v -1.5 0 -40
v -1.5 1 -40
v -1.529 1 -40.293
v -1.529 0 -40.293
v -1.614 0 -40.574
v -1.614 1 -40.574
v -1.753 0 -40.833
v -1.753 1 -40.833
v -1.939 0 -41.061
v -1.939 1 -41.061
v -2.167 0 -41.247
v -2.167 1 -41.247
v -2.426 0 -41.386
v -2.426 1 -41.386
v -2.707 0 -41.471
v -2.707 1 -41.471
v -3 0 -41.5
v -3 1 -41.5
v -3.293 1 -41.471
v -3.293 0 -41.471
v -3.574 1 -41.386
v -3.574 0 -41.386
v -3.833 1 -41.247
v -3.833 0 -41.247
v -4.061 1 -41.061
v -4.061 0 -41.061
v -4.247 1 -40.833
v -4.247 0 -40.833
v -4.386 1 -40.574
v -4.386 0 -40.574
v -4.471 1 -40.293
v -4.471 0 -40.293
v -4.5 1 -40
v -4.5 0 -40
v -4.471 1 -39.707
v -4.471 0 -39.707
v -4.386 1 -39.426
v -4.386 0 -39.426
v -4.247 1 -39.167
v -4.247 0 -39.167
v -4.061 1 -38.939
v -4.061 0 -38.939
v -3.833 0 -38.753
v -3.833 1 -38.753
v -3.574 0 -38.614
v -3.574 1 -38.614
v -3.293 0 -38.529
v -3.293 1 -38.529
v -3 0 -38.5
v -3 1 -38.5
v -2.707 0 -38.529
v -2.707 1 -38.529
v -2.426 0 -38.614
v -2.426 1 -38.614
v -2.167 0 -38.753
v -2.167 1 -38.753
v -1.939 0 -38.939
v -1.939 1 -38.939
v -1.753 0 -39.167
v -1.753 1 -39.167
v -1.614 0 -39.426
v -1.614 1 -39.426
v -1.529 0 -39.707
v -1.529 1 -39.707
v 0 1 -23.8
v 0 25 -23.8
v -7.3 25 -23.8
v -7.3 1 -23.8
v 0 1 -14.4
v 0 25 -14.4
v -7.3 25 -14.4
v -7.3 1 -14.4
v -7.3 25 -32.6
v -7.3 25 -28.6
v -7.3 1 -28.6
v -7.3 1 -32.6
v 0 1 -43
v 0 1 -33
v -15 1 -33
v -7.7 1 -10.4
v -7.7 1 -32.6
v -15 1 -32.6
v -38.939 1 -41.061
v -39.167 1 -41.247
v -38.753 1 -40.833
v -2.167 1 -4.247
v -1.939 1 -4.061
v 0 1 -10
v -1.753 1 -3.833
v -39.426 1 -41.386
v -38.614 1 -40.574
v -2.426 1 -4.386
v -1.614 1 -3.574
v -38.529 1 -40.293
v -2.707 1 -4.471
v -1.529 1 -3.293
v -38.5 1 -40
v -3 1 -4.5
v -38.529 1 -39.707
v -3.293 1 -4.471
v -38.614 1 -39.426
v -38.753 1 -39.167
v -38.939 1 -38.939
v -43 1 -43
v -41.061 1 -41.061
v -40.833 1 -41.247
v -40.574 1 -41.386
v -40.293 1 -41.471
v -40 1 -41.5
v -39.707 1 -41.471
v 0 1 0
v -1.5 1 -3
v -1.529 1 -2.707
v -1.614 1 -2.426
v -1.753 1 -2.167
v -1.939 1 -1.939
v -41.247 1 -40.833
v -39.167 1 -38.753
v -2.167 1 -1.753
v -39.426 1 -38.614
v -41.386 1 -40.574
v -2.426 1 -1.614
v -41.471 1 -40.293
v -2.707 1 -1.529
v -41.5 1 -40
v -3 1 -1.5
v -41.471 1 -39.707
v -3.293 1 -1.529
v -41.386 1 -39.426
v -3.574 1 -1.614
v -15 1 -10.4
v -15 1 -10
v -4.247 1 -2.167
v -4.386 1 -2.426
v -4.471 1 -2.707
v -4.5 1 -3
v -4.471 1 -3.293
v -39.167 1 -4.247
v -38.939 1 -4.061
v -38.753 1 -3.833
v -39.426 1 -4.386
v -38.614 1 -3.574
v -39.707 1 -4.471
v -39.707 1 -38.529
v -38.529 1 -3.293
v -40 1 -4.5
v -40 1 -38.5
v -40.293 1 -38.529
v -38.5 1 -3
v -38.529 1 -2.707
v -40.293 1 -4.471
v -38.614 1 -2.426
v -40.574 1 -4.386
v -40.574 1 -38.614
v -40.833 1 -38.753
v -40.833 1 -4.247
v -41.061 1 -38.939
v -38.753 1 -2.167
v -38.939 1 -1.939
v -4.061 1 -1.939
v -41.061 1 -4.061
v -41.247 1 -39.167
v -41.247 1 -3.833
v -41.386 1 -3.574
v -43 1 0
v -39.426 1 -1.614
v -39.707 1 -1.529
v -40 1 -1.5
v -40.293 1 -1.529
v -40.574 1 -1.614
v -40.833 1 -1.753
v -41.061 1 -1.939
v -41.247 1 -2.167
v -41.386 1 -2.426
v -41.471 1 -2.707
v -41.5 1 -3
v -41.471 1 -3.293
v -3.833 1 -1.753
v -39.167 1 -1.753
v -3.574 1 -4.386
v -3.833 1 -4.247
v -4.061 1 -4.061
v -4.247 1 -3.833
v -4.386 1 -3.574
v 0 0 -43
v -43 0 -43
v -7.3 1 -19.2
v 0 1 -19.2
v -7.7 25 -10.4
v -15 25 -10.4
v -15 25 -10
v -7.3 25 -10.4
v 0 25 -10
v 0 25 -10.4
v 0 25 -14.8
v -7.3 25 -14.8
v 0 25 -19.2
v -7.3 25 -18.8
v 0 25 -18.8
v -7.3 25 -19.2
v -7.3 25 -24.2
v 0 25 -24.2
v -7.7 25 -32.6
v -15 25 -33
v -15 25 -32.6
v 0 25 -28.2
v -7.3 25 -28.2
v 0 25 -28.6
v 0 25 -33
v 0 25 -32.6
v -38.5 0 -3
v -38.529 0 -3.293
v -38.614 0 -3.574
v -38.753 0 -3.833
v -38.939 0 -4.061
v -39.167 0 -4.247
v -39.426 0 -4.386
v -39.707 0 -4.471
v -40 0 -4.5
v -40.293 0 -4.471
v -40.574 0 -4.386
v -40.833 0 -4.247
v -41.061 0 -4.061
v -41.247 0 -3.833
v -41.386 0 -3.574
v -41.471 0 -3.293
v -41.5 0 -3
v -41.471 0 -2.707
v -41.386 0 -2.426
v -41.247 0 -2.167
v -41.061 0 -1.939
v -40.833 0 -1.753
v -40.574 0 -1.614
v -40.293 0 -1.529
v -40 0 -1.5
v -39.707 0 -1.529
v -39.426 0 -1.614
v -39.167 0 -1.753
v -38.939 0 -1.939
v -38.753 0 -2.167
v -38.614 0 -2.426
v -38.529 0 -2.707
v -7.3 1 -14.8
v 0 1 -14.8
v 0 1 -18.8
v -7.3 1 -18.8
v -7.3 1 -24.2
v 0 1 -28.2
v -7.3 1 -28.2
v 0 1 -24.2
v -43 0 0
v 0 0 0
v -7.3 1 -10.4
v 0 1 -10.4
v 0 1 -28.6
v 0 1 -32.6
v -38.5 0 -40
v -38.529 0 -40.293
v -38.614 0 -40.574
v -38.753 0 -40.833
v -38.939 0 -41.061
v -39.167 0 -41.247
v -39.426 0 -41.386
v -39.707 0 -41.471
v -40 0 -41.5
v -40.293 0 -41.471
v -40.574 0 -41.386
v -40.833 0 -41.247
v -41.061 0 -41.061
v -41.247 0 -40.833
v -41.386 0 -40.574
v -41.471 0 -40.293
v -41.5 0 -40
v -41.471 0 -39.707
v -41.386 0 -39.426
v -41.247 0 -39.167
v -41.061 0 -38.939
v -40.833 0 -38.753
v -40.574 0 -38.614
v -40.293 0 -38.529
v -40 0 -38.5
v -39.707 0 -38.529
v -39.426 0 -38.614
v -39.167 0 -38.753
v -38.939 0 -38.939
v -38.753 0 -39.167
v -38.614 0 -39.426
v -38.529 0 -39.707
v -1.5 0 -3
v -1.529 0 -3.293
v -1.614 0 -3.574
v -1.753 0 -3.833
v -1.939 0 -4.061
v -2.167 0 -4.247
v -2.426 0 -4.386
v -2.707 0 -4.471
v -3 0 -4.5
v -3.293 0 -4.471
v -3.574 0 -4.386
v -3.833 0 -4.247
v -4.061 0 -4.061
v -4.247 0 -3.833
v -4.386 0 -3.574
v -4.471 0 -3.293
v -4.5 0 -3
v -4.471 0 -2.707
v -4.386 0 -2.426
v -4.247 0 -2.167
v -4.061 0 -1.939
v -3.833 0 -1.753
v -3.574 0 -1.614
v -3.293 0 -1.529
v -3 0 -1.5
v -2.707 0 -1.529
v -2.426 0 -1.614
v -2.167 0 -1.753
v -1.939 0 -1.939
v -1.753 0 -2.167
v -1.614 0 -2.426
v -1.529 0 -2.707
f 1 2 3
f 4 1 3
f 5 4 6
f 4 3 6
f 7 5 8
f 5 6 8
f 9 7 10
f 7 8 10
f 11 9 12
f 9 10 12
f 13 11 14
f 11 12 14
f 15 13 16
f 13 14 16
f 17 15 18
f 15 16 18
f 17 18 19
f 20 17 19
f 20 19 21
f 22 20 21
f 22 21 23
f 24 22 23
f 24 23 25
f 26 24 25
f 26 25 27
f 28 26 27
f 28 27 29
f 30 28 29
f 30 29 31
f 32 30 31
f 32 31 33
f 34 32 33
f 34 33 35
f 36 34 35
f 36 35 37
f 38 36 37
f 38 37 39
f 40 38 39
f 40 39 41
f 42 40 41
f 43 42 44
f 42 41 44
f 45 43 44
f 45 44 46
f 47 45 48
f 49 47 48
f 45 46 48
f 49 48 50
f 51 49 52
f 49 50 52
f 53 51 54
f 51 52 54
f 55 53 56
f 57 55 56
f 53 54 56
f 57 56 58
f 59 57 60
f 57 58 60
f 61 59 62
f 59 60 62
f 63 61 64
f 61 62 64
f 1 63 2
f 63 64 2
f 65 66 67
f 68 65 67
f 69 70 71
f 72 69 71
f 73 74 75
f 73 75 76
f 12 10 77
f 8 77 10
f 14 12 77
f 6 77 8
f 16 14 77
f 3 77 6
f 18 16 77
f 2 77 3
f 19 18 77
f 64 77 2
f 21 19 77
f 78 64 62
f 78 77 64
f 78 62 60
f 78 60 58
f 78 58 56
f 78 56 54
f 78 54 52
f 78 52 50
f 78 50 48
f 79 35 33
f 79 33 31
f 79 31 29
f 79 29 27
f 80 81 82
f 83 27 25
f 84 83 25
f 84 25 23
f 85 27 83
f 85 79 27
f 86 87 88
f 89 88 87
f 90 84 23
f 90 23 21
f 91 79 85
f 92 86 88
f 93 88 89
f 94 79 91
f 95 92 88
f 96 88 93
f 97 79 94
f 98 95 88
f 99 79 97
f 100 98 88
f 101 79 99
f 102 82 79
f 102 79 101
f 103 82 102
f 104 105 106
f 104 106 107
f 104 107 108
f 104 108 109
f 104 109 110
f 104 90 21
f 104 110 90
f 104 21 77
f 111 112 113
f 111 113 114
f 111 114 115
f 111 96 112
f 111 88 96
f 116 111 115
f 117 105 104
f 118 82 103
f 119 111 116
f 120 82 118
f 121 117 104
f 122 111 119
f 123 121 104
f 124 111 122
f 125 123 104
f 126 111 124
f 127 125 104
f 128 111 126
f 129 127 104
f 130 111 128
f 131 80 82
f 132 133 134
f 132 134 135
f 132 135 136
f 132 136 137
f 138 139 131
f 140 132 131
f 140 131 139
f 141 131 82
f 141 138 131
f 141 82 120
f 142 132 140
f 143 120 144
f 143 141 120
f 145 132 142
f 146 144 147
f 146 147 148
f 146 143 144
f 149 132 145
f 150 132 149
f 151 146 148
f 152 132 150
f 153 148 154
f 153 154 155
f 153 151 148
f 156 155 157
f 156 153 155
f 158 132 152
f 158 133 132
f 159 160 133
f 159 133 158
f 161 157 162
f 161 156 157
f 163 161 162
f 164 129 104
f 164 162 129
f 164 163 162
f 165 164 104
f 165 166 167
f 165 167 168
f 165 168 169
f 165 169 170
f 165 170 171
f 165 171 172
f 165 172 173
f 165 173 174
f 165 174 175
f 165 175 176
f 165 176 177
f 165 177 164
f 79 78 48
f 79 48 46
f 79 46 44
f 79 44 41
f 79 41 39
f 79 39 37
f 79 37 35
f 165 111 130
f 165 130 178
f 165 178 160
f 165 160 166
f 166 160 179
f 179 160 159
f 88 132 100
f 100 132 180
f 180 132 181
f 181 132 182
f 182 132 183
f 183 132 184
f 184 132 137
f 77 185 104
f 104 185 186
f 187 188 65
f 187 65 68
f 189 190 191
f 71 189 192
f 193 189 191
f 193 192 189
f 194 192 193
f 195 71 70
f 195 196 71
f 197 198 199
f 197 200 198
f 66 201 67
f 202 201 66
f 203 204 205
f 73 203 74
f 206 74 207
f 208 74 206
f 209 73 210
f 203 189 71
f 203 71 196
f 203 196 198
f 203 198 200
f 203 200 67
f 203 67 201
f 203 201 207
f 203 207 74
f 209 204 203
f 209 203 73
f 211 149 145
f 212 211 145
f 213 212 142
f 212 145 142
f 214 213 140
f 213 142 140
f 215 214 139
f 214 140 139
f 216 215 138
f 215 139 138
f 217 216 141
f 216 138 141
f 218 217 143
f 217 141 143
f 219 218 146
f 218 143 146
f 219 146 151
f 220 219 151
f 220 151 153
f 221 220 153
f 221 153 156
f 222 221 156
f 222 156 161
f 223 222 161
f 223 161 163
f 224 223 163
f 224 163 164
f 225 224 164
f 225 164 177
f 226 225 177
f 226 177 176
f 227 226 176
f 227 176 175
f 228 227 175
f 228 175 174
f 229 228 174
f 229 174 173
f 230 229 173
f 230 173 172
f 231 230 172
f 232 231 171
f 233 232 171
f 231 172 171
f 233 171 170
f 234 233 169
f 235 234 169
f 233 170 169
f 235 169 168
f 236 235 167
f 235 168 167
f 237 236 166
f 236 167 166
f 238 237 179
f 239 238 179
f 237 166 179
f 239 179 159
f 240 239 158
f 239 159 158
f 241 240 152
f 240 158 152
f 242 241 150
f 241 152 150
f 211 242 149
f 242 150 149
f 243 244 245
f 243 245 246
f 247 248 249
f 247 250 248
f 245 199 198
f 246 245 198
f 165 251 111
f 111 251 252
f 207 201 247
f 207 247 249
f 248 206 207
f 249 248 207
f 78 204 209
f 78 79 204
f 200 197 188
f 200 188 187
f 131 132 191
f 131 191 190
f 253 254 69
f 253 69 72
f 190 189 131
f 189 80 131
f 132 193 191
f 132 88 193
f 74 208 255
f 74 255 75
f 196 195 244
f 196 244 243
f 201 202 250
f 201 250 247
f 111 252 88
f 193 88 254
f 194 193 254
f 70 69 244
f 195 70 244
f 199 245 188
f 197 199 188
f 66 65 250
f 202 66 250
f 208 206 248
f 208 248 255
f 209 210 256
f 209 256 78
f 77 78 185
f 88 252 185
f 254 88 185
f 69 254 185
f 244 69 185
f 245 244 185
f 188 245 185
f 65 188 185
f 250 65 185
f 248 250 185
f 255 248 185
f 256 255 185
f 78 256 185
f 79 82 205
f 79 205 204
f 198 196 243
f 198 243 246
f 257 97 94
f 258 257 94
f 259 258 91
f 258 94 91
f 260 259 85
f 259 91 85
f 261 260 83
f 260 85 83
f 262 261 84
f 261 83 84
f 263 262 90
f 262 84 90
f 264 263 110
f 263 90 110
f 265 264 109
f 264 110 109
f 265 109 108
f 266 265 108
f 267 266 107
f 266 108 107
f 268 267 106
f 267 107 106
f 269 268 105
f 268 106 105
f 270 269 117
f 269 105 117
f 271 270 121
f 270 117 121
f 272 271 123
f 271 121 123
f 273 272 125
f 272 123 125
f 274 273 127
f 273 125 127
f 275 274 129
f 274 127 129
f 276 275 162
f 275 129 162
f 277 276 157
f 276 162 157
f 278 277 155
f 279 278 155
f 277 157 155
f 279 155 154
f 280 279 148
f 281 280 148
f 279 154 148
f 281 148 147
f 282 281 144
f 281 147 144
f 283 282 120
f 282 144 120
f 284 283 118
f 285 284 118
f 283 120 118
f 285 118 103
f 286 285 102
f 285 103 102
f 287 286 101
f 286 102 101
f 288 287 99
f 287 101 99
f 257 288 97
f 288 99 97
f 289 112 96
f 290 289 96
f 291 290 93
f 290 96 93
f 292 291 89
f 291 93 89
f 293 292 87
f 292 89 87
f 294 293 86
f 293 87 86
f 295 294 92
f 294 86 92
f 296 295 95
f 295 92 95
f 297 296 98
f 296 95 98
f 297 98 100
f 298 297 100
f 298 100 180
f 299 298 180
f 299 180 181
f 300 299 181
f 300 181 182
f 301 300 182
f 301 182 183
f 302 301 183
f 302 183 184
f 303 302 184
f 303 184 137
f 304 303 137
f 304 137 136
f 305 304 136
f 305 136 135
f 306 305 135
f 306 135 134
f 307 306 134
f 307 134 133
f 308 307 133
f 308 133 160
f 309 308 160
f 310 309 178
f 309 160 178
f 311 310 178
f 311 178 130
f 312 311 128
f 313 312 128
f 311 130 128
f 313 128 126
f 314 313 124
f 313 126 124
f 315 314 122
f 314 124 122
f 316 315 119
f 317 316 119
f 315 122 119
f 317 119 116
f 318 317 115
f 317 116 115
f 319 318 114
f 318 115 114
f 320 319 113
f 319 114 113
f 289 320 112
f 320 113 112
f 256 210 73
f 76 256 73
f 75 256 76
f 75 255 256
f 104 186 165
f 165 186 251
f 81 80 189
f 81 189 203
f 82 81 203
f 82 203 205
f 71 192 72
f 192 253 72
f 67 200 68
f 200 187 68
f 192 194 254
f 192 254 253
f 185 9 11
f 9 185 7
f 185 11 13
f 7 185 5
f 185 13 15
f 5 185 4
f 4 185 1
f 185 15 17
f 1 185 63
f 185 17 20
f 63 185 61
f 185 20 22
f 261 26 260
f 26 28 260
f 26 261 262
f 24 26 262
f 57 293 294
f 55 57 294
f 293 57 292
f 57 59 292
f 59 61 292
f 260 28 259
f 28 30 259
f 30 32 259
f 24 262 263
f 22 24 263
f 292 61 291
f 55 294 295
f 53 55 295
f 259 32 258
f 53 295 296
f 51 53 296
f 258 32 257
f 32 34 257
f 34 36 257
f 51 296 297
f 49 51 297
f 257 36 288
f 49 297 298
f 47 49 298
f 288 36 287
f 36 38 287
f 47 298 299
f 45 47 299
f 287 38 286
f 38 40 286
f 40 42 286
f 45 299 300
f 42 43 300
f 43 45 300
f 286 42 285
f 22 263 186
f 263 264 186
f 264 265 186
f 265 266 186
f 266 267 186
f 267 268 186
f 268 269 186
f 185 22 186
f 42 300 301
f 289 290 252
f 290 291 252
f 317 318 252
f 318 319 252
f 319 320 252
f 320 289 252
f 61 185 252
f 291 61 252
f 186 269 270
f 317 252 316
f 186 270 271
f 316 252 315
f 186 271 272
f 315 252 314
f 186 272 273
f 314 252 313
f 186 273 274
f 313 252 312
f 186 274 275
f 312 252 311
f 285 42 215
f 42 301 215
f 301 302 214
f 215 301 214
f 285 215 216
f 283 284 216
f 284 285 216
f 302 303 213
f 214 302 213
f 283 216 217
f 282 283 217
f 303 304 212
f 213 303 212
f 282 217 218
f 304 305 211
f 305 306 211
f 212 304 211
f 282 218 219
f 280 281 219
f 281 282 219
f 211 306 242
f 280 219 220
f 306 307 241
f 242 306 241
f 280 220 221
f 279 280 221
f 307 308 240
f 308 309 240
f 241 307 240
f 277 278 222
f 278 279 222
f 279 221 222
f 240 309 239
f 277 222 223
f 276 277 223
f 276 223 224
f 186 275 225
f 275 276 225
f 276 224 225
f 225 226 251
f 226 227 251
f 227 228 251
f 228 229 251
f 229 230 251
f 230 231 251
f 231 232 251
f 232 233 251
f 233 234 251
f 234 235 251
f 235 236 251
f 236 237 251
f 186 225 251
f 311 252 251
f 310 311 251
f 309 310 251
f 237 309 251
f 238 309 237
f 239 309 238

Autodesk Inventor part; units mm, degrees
ref_plane "YZ Plane" through (0, 0, 0) normal (1, 0, 0) x (0, 1, 0)
ref_plane "XZ Plane" through (0, 0, 0) normal (0, 1, 0) x (-1, 0, 0)
ref_plane "XY Plane" through (0, 0, 0) normal (0, 0, 1) x (1, 0, 0)
sketch "Sketch1" plane through (0, 0, 0) normal (0, 1, 0) x (-1, 0, 0)
  line L0 (0, 0) -> (0, -43)
  line L1 (0, -43) -> (43, -43)
  line L2 (43, -43) -> (43, 0)
  line L3 (43, 0) -> (0, 0)
  dimension "d0" = 43
  dimension "d1" = 43
extrude "Extrusion1" add sketch "Sketch1" along normal blind 1
sketch "Sketch2" plane through (0, 1, 0) normal (0, 1, 0) x (1, 0, 0)
  line L0 (-43, 0) -> (0, 0) projected
  line L1 (0, 0) -> (-3, 0)
  line L2 (-3, 0) -> (-3, 3)
  line L3 (-3, 3) -> (0, 3)
  circle A0 centre (-3, 3) radius 1.5
  line L4 (0, 43) -> (-43, 43) projected
  line L5 (0, 0) -> (-43, 43)
  line L6 (-43, 43) -> (-43, 0)
  line L7 (-43, 43) -> (-43, 0) projected
  line L8 (0, 0) -> (0, 43) projected
  line L9 (-43, 0) -> (0, 43)
  line L10 (0, 43) -> (-21.5, 21.5)
  circle A1 centre (-3, 40) radius 1.5
  circle A2 centre (-40, 40) radius 1.5
  circle A3 centre (-40, 3) radius 1.5
  dimension "d4" = 3
  dimension "d5" = 3
  dimension "d6" = 3
  dimension "d9" = 360
extrude "Extrusion2" cut sketch "Sketch2" against normal through all contours A3 L9 | L9 A3 | A0 L5 L2 | L2 L5 A0 | A2 L5 | L5 A2 | L5 L3 A0 | L5 A0 L3 | A1 L9 | L9 A1
sketch "Sketch3" plane through (0, 1, 0) normal (0, 1, 0) x (1, 0, 0)
  line L0 (-43, 0) -> (0, 0) projected
  line L1 (0, 0) -> (0, 10)
  line L2 (0, 0) -> (0, 43) projected
  line L3 (0, 10) -> (0, 43)
  line L4 (0, 43) -> (0, 33)
  line L5 (0, 33) -> (0, 10)
  line L6 (0, 10) -> (-15, 10)
  line L7 (-15, 10) -> (-15, 33)
  line L8 (-15, 33) -> (0, 33)
  line L9 (0, 10) -> (0, 14.4)
  line L10 (0, 14.4) -> (0, 18.8)
  line L11 (0, 33) -> (0, 28.6)
  line L12 (0, 28.6) -> (0, 24.2)
  line L13 (0, 24.2) -> (0, 18.8)
  line L14 (0, 14.4) -> (0, 15)
  line L15 (0, 33) -> (0, 32.6)
  line L16 (0, 32.6) -> (-15, 32.6)
  line L17 (0, 32.6) -> (0, 28.6)
  line L18 (0, 28.6) -> (-15, 28.6)
  line L19 (0, 28.6) -> (0, 28.2)
  line L20 (0, 28.2) -> (-15, 28.2)
  line L21 (0, 28.2) -> (0, 24.2)
  line L22 (0, 18.8) -> (0, 24.2)
  line L23 (0, 32.6) -> (0, 28.6)
  line L24 (0, 28.2) -> (0, 24.2)
  line L25 (0, 24.2) -> (-15, 24.2)
  line L26 (0, 24.2) -> (0, 23.8)
  line L27 (0, 23.8) -> (-15, 23.8)
  line L28 (0, 18.8) -> (0, 19.2)
  line L29 (0, 19.2) -> (-15, 19.2)
  line L30 (0, 18.8) -> (-15, 18.8)
  line L31 (0, 14.4) -> (-15, 14.4)
  line L32 (0, 10) -> (0, 10.4)
  line L33 (0, 10.4) -> (-15, 10.4)
  line L34 (0, 10.4) -> (0, 14.4)
  line L35 (0, 14.4) -> (0, 14.8)
  line L36 (0, 14.8) -> (-15, 14.8)
  line L37 (0, 10) -> (-7.5, 10)
  line L38 (-7.5, 10) -> (-7.5, 33)
  line L39 (-7.5, 10) -> (-7.7, 10)
  line L40 (-7.7, 10) -> (-7.3, 10)
  line L41 (-7.3, 10) -> (-7.3, 33)
  line L42 (-7.7, 10) -> (-7.7, 33)
  point P0 (-7.7, 10.4)
  point P1 (-7.3, 10.4)
  point P2 (-7.3, 14.4)
  point P3 (-7.3, 14.8)
  point P4 (-7.3, 18.8)
  point P5 (-7.3, 19.2)
  point P6 (-7.3, 23.8)
  point P7 (-7.3, 24.2)
  point P8 (-7.3, 28.2)
  point P9 (-7.3, 28.6)
  point P10 (-7.3, 32.6)
  point P11 (-7.7, 32.6)
  dimension "d13" = 10
  dimension "d14" = 10
  dimension "d15" = 23
  dimension "d16" = 15
  dimension "d17" = 4.4
  dimension "d18" = 4.4
  dimension "d19" = 4.4
  dimension "d20" = 4.4
  dimension "d22" = 0.4
  dimension "d23" = 0.4
  dimension "d24" = 0.4
  dimension "d25" = 0.4
  dimension "d26" = 0.4
  dimension "d27" = 0.4
  dimension "d28" = 0.2
  dimension "d29" = 0.4
extrude "Extrusion3" add sketch "Sketch3" along normal blind 24 contours L6 L41 L33 L2 | L6 L38 L33 L41 | L31 L41 L36 L2 | L33 L38 L31 L41 | L6 L42 L33 L38 | L31 L38 L36 L41 | L33 L42 L31 L38 | L6 L7 L33 L42 | L36 L38 L30 L41 | L31 L42 L36 L38 | L30 L41 L29 L2 | L36 L42 L30 L38 | L30 L38 L29 L41 | L30 L42 L29 L38 | L29 L38 L27 L41 | L27 L41 L25 L2 | L29 L42 L27 L38 | L27 L38 L25 L41 | L27 L42 L25 L38 | L25 L38 L20 L41 | L20 L41 L18 L2 | L25 L42 L20 L38 | L20 L38 L18 L41 | L20 L42 L18 L38 | L18 L38 L16 L41 | L16 L41 L8 L2 | L18 L42 L16 L38 | L16 L38 L8 L41 | L16 L42 L8 L38 | L16 L7 L8 L42
properties part number "L298N"
